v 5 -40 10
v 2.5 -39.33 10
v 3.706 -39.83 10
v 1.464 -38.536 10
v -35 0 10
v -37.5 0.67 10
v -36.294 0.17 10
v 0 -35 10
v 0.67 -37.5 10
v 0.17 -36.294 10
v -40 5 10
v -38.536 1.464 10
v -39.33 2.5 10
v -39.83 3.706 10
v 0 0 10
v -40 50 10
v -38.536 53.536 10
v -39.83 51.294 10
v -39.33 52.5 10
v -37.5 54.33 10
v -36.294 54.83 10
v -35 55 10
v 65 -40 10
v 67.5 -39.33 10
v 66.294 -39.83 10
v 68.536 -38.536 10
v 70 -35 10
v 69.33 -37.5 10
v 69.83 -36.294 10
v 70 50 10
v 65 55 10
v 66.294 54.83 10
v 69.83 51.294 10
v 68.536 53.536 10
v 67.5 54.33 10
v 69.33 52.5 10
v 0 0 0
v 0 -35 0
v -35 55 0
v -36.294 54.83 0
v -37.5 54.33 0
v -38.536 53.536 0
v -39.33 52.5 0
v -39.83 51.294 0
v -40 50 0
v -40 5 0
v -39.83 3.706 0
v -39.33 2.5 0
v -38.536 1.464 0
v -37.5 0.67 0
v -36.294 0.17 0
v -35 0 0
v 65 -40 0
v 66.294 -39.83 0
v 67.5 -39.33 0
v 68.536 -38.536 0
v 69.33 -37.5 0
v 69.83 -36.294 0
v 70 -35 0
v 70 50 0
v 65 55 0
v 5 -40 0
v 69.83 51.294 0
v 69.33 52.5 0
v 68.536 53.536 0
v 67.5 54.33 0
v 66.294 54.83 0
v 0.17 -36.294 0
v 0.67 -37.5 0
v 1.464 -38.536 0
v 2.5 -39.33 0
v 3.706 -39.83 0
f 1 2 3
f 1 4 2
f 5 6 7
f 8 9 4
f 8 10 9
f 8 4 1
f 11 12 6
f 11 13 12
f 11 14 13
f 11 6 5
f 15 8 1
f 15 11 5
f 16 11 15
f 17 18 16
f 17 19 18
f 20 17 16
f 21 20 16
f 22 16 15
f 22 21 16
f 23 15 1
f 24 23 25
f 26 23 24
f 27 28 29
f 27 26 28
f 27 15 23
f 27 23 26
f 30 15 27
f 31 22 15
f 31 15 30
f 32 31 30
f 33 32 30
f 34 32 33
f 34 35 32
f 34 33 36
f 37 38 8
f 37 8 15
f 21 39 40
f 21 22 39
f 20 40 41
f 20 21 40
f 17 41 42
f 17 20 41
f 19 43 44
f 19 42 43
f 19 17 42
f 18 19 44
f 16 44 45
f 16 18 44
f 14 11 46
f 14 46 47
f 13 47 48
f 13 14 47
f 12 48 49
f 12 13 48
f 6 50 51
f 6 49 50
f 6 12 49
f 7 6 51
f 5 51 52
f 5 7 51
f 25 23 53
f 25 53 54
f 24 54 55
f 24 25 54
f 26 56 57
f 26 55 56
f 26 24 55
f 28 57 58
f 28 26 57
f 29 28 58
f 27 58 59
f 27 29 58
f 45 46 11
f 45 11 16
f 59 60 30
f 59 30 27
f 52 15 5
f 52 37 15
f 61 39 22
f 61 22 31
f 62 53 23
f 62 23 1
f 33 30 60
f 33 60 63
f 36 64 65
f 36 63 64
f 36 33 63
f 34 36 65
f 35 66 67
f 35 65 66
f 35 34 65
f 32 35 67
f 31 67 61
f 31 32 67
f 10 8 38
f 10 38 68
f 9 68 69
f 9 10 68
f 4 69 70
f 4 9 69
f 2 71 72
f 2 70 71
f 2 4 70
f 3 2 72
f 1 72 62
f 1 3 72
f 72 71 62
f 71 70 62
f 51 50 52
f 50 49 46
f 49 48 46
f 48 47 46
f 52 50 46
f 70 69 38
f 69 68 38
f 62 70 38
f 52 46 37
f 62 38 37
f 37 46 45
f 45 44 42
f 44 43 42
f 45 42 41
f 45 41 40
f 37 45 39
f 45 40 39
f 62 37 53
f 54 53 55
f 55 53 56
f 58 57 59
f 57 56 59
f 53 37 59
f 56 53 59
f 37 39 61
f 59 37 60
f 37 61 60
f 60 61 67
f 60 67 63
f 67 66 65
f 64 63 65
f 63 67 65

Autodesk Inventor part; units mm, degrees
ref_plane "YZ Plane" through (0, 0, 0) normal (1, 0, 0) x (0, 1, 0)
ref_plane "XZ Plane" through (0, 0, 0) normal (0, 1, 0) x (-1, 0, 0)
ref_plane "XY Plane" through (0, 0, 0) normal (0, 0, 1) x (1, 0, 0)
sketch "Schizzo1" plane through (0, 0, 0) normal (0, 0, 1) x (1, 0, 0)
  line L0 (0, 0) -> (-40, 0)
  line L1 (-40, 0) -> (-40, 55)
  line L2 (-40, 55) -> (70, 55)
  line L3 (70, 55) -> (70, -40)
  line L4 (70, -40) -> (0, -40)
  line L5 (0, -40) -> (0, 0)
  dimension "d0" = 40
  dimension "d1" = 40
  dimension "d2" = 55
  dimension "d3" = 70
extrude "Estrusione1" add sketch "Schizzo1" along normal blind 10
fillet "Raccordo1" radius 5 5 edges at (-40, 55, 5) (70, 55, 5) (70, -40, 5) (-40, 0, 5) (0, -40, 5)
properties part number "Supporto salita lama"
